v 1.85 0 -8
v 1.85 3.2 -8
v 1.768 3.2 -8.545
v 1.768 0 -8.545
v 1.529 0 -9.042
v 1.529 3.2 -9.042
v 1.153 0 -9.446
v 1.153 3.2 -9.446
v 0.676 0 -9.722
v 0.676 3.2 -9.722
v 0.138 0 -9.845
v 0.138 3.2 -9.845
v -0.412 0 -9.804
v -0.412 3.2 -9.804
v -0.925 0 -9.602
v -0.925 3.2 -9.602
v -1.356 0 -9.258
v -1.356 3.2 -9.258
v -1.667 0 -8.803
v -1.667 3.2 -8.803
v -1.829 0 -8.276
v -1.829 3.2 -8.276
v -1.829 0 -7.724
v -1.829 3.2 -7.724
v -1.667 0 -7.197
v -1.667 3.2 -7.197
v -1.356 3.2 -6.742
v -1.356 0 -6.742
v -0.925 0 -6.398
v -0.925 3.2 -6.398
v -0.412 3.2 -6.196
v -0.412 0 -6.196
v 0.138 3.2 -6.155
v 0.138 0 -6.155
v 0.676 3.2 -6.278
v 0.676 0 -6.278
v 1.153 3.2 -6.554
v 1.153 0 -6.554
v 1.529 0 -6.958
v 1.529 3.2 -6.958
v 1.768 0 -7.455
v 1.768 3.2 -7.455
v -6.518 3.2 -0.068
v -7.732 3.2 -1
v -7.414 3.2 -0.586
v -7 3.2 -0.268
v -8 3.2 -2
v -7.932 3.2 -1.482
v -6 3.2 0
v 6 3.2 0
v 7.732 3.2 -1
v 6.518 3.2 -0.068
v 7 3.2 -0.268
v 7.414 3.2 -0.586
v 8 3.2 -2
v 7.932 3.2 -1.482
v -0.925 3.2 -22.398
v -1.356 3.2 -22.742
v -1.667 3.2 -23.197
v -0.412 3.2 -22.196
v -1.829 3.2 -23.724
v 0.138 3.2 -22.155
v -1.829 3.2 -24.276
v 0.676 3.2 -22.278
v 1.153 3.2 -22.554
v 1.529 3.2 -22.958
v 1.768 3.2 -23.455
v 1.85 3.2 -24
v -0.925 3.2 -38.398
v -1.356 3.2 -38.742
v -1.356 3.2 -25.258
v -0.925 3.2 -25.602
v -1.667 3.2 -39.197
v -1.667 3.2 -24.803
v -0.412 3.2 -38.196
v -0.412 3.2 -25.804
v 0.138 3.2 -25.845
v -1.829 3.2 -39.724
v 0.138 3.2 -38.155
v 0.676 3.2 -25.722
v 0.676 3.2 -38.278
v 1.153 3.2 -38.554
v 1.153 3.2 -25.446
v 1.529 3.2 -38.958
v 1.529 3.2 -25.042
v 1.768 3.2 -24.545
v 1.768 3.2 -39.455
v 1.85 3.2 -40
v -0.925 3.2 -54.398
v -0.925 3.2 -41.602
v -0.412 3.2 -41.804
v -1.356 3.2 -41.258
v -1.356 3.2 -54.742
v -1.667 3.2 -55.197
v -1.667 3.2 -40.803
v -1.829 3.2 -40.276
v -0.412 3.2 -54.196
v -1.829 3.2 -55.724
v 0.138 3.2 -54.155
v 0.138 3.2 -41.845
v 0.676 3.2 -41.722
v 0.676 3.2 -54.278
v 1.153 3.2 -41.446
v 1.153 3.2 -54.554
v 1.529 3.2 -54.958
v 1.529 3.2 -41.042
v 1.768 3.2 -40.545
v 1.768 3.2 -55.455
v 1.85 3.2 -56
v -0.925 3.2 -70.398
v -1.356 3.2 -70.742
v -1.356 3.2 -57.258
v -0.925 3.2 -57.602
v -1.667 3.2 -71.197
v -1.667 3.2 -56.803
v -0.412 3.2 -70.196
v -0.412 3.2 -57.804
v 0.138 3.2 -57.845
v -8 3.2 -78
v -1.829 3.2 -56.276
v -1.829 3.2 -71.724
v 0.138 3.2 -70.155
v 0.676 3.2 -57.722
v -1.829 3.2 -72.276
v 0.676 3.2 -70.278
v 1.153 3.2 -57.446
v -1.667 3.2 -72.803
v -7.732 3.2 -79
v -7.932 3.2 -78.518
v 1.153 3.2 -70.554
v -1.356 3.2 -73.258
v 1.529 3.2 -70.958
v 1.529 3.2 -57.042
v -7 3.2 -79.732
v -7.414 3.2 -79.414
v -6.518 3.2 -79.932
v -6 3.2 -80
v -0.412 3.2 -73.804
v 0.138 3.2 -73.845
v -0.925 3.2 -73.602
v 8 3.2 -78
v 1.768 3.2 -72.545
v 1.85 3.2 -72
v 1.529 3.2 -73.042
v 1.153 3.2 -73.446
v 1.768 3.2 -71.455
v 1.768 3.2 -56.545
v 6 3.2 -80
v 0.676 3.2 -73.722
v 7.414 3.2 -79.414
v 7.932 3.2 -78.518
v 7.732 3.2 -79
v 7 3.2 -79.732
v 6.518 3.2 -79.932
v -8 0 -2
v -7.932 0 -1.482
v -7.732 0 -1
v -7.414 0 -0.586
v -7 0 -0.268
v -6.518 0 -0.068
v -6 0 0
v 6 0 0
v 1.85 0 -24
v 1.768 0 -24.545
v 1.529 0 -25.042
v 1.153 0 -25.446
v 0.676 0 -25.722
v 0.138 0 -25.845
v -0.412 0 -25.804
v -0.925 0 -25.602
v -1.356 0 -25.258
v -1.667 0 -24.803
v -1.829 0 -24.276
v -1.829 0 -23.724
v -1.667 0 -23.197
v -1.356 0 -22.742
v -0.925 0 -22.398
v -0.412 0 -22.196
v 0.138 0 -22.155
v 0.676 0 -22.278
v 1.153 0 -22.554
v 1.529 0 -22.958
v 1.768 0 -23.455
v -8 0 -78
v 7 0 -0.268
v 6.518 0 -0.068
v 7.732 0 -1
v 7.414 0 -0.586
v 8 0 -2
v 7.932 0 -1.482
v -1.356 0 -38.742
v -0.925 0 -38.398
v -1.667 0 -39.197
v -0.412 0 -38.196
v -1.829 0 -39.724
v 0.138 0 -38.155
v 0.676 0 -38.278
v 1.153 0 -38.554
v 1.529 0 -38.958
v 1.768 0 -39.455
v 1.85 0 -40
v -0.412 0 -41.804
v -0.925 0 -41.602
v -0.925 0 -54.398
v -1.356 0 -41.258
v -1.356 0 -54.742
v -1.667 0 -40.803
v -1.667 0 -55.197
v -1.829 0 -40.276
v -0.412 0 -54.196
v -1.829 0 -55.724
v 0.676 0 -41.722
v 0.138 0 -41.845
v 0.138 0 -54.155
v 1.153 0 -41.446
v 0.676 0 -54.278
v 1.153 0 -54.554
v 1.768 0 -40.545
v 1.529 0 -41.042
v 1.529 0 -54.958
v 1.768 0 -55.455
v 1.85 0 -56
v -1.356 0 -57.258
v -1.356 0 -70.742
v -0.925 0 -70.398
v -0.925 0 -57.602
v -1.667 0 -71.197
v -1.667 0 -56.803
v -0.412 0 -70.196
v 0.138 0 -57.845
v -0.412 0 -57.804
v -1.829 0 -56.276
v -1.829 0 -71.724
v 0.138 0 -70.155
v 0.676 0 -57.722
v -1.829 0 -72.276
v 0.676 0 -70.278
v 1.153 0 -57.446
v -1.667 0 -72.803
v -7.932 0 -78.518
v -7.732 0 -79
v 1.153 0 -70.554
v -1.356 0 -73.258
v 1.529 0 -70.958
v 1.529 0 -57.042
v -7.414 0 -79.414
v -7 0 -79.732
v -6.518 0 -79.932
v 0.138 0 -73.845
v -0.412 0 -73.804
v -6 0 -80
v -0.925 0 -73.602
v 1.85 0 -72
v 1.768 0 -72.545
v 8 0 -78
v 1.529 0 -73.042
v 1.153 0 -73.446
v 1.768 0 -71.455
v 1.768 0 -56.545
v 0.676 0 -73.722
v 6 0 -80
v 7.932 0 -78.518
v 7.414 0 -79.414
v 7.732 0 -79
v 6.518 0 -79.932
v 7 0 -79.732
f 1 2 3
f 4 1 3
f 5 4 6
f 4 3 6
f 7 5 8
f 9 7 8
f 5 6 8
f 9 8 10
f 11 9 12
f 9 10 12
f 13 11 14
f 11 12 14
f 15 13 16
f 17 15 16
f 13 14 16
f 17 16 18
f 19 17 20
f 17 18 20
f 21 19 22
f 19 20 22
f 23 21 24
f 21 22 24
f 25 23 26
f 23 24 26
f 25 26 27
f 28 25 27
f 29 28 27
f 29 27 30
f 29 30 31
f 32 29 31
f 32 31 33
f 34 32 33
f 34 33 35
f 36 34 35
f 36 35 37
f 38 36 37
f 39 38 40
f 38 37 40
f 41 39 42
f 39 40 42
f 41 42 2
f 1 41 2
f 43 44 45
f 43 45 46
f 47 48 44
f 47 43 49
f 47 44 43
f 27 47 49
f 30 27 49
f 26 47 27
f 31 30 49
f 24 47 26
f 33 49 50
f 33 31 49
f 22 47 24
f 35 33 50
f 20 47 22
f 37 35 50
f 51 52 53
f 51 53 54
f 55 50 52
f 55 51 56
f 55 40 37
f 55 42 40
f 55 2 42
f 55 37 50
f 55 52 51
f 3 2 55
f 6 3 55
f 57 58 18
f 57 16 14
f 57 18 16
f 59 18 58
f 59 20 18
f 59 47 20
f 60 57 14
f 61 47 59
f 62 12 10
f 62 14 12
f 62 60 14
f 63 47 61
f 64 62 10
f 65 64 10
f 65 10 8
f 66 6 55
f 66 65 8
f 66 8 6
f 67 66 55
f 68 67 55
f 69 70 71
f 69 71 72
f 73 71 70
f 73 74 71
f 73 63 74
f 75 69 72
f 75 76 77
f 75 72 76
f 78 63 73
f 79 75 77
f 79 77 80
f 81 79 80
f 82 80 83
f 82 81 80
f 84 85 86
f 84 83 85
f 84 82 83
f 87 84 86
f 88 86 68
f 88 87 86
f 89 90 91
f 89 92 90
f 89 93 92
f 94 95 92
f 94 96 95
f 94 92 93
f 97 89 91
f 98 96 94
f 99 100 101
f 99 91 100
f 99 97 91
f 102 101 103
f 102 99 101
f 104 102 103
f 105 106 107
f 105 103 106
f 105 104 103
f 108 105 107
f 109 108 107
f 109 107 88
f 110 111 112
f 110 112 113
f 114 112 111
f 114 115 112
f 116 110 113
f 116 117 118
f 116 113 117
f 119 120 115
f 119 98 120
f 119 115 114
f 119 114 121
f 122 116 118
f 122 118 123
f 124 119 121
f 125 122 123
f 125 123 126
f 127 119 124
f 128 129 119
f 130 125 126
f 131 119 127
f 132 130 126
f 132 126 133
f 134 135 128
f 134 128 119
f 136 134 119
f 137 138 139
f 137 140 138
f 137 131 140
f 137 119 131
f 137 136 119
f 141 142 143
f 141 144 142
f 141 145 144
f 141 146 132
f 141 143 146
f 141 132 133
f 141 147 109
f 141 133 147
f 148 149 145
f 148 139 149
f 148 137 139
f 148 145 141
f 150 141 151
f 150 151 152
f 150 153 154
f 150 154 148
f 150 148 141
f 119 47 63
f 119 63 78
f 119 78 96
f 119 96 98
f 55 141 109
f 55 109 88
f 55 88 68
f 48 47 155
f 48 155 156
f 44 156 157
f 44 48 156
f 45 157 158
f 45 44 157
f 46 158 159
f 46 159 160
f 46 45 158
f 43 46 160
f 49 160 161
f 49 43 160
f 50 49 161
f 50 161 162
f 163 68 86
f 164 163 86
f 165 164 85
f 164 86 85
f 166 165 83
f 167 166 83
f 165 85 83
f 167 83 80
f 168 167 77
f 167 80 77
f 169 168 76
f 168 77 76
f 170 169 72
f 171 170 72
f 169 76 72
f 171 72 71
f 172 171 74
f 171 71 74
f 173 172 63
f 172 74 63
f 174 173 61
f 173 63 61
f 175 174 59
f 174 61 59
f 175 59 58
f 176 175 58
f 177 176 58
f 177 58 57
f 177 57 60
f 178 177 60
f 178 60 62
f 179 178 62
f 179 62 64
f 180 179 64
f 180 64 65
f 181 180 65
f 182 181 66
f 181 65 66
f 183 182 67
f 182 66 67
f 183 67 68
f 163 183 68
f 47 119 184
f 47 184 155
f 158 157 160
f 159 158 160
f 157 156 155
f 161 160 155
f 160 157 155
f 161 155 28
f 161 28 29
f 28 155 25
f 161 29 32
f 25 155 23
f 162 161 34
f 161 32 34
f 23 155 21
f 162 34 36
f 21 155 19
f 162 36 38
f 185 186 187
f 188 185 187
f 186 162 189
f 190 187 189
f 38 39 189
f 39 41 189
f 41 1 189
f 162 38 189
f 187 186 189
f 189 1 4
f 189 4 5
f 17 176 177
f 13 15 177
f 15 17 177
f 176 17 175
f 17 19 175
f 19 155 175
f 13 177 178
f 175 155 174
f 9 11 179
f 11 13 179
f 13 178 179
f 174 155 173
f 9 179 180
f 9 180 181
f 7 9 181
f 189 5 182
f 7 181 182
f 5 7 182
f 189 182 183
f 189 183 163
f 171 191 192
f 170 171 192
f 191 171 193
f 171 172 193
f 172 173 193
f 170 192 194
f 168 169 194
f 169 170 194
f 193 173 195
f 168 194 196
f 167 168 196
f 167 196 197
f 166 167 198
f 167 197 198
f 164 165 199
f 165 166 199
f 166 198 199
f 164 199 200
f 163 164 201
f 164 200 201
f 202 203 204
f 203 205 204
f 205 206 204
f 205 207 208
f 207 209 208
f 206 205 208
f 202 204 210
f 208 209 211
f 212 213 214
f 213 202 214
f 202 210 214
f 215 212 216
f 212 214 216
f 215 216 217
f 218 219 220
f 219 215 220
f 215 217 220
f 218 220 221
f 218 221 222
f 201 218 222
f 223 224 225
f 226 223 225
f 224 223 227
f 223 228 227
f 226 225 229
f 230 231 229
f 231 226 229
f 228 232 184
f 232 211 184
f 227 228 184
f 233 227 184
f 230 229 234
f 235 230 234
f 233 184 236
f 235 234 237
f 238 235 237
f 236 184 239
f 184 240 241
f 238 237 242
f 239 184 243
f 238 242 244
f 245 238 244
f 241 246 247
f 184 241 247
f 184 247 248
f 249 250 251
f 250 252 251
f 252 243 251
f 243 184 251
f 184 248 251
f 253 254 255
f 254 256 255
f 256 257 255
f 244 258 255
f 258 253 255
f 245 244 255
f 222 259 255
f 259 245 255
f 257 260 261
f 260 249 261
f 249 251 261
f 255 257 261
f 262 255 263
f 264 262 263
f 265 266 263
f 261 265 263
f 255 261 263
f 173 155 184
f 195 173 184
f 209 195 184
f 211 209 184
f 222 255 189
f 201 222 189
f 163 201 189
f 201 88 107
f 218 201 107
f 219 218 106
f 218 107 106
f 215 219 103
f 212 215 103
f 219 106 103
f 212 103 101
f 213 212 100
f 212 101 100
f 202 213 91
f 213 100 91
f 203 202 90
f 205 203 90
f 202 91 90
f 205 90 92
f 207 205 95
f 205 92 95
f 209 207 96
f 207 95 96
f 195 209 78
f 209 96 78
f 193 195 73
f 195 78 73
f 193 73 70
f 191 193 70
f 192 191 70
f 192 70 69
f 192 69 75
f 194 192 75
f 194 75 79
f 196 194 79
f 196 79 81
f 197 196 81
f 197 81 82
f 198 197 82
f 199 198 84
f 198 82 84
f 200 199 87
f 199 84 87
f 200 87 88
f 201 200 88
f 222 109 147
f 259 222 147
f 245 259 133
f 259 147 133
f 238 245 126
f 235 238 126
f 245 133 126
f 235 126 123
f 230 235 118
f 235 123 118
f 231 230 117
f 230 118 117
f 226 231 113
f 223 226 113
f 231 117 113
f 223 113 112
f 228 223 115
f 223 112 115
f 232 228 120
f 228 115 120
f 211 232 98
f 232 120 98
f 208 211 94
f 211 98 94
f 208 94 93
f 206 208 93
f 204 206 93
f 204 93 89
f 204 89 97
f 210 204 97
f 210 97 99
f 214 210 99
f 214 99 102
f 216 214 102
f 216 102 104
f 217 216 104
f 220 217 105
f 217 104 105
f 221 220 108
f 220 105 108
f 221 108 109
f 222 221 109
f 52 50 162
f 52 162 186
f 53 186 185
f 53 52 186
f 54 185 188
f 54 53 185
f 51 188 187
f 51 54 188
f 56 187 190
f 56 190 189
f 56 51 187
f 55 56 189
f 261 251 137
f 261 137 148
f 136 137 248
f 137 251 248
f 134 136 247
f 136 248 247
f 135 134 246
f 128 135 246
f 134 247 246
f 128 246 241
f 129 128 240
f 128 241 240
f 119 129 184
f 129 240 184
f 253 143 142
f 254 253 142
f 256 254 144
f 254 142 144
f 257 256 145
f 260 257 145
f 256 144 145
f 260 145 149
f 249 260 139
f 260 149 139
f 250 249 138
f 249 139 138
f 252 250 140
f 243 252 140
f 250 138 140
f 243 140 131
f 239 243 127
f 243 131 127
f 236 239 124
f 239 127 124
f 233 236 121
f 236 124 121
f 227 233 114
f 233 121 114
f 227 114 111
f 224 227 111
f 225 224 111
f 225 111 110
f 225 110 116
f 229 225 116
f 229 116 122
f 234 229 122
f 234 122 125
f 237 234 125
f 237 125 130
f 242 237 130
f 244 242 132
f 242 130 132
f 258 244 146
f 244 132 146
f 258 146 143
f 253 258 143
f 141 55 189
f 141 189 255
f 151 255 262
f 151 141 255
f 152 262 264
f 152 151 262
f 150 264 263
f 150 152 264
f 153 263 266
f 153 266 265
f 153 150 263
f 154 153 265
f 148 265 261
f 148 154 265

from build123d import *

# Parameters (mm, degrees)
SKETCH1_R               = 1.85
BOSS_EXTRUDE1_DEPTH     = 3.2
CUT_EXTRUDE1_DEPTH      = 4.2
CUT_EXTRUDE1_DEPTH_BACK = 1
FILLET1_R               = 2


with BuildPart() as part:
    # Sketch1 → Boss-Extrude1 (new body)
    with BuildSketch(Plane(origin=(0, 3.2, 0), x_dir=(1, 0, 0), z_dir=(0, 1, 0))):
        with BuildLine():
            Line((8, 2), (8, 286))
            ThreePointArc((8, 286), (7.414213562, 287.414213562), (6, 288))
            Line((6, 288), (-6, 288))
            ThreePointArc((-6, 288), (-7.414213562, 287.414213562), (-8, 286))
            Line((-8, 286), (-8, 2))
            ThreePointArc((-8, 2), (-7.414213562, 0.585786438), (-6, 0))
            Line((-6, 0), (6, 0))
            ThreePointArc((6, 0), (7.414213562, 0.585786438), (8, 2))
        make_face()
        with Locations((0, 280)):
            Circle(SKETCH1_R, mode=Mode.SUBTRACT)
        with Locations((0, 264)):
            Circle(SKETCH1_R, mode=Mode.SUBTRACT)
        with Locations((0, 248)):
            Circle(SKETCH1_R, mode=Mode.SUBTRACT)
        with Locations((0, 232)):
            Circle(SKETCH1_R, mode=Mode.SUBTRACT)
        with Locations((0, 216)):
            Circle(SKETCH1_R, mode=Mode.SUBTRACT)
        with Locations((0, 200)):
            Circle(SKETCH1_R, mode=Mode.SUBTRACT)
        with Locations((0, 184)):
            Circle(SKETCH1_R, mode=Mode.SUBTRACT)
        with Locations((0, 168)):
            Circle(SKETCH1_R, mode=Mode.SUBTRACT)
        with Locations((0, 152)):
            Circle(SKETCH1_R, mode=Mode.SUBTRACT)
        with Locations((0, 136)):
            Circle(SKETCH1_R, mode=Mode.SUBTRACT)
        with Locations((0, 120)):
            Circle(SKETCH1_R, mode=Mode.SUBTRACT)
        with Locations((0, 104)):
            Circle(SKETCH1_R, mode=Mode.SUBTRACT)
        with Locations((0, 88)):
            Circle(SKETCH1_R, mode=Mode.SUBTRACT)
        with Locations((0, 72)):
            Circle(SKETCH1_R, mode=Mode.SUBTRACT)
        with Locations((0, 56)):
            Circle(SKETCH1_R, mode=Mode.SUBTRACT)
        with Locations((0, 40)):
            Circle(SKETCH1_R, mode=Mode.SUBTRACT)
        with Locations((0, 24)):
            Circle(SKETCH1_R, mode=Mode.SUBTRACT)
        with Locations((0, 8)):
            Circle(SKETCH1_R, mode=Mode.SUBTRACT)
    extrude(amount=-BOSS_EXTRUDE1_DEPTH)

    # Sketch2 → Cut-Extrude1 (cut, two sides)
    with BuildSketch(Plane(origin=(0, 0, 0), x_dir=(1, 0, 0), z_dir=(0, 1, 0))) as cut_extrude1_sk:
        Polygon((-474.979607439, 80), (-38.646772996, 80), (26.442528892, 80), (462.775363335, 80), (462.775363335, 952.665668885), (-474.979607439, 952.665668885), align=None)
    extrude(amount=CUT_EXTRUDE1_DEPTH, mode=Mode.SUBTRACT)
    extrude(cut_extrude1_sk.sketch, amount=-CUT_EXTRUDE1_DEPTH_BACK, mode=Mode.SUBTRACT)

    # Fillet1
    fillet1_edges = [part.edges().sort_by_distance(p)[0] for p in [
        (8, 1.6, -80),
        (-8, 1.6, -80),
    ]]
    fillet(fillet1_edges, radius=FILLET1_R)


solid = part.part
